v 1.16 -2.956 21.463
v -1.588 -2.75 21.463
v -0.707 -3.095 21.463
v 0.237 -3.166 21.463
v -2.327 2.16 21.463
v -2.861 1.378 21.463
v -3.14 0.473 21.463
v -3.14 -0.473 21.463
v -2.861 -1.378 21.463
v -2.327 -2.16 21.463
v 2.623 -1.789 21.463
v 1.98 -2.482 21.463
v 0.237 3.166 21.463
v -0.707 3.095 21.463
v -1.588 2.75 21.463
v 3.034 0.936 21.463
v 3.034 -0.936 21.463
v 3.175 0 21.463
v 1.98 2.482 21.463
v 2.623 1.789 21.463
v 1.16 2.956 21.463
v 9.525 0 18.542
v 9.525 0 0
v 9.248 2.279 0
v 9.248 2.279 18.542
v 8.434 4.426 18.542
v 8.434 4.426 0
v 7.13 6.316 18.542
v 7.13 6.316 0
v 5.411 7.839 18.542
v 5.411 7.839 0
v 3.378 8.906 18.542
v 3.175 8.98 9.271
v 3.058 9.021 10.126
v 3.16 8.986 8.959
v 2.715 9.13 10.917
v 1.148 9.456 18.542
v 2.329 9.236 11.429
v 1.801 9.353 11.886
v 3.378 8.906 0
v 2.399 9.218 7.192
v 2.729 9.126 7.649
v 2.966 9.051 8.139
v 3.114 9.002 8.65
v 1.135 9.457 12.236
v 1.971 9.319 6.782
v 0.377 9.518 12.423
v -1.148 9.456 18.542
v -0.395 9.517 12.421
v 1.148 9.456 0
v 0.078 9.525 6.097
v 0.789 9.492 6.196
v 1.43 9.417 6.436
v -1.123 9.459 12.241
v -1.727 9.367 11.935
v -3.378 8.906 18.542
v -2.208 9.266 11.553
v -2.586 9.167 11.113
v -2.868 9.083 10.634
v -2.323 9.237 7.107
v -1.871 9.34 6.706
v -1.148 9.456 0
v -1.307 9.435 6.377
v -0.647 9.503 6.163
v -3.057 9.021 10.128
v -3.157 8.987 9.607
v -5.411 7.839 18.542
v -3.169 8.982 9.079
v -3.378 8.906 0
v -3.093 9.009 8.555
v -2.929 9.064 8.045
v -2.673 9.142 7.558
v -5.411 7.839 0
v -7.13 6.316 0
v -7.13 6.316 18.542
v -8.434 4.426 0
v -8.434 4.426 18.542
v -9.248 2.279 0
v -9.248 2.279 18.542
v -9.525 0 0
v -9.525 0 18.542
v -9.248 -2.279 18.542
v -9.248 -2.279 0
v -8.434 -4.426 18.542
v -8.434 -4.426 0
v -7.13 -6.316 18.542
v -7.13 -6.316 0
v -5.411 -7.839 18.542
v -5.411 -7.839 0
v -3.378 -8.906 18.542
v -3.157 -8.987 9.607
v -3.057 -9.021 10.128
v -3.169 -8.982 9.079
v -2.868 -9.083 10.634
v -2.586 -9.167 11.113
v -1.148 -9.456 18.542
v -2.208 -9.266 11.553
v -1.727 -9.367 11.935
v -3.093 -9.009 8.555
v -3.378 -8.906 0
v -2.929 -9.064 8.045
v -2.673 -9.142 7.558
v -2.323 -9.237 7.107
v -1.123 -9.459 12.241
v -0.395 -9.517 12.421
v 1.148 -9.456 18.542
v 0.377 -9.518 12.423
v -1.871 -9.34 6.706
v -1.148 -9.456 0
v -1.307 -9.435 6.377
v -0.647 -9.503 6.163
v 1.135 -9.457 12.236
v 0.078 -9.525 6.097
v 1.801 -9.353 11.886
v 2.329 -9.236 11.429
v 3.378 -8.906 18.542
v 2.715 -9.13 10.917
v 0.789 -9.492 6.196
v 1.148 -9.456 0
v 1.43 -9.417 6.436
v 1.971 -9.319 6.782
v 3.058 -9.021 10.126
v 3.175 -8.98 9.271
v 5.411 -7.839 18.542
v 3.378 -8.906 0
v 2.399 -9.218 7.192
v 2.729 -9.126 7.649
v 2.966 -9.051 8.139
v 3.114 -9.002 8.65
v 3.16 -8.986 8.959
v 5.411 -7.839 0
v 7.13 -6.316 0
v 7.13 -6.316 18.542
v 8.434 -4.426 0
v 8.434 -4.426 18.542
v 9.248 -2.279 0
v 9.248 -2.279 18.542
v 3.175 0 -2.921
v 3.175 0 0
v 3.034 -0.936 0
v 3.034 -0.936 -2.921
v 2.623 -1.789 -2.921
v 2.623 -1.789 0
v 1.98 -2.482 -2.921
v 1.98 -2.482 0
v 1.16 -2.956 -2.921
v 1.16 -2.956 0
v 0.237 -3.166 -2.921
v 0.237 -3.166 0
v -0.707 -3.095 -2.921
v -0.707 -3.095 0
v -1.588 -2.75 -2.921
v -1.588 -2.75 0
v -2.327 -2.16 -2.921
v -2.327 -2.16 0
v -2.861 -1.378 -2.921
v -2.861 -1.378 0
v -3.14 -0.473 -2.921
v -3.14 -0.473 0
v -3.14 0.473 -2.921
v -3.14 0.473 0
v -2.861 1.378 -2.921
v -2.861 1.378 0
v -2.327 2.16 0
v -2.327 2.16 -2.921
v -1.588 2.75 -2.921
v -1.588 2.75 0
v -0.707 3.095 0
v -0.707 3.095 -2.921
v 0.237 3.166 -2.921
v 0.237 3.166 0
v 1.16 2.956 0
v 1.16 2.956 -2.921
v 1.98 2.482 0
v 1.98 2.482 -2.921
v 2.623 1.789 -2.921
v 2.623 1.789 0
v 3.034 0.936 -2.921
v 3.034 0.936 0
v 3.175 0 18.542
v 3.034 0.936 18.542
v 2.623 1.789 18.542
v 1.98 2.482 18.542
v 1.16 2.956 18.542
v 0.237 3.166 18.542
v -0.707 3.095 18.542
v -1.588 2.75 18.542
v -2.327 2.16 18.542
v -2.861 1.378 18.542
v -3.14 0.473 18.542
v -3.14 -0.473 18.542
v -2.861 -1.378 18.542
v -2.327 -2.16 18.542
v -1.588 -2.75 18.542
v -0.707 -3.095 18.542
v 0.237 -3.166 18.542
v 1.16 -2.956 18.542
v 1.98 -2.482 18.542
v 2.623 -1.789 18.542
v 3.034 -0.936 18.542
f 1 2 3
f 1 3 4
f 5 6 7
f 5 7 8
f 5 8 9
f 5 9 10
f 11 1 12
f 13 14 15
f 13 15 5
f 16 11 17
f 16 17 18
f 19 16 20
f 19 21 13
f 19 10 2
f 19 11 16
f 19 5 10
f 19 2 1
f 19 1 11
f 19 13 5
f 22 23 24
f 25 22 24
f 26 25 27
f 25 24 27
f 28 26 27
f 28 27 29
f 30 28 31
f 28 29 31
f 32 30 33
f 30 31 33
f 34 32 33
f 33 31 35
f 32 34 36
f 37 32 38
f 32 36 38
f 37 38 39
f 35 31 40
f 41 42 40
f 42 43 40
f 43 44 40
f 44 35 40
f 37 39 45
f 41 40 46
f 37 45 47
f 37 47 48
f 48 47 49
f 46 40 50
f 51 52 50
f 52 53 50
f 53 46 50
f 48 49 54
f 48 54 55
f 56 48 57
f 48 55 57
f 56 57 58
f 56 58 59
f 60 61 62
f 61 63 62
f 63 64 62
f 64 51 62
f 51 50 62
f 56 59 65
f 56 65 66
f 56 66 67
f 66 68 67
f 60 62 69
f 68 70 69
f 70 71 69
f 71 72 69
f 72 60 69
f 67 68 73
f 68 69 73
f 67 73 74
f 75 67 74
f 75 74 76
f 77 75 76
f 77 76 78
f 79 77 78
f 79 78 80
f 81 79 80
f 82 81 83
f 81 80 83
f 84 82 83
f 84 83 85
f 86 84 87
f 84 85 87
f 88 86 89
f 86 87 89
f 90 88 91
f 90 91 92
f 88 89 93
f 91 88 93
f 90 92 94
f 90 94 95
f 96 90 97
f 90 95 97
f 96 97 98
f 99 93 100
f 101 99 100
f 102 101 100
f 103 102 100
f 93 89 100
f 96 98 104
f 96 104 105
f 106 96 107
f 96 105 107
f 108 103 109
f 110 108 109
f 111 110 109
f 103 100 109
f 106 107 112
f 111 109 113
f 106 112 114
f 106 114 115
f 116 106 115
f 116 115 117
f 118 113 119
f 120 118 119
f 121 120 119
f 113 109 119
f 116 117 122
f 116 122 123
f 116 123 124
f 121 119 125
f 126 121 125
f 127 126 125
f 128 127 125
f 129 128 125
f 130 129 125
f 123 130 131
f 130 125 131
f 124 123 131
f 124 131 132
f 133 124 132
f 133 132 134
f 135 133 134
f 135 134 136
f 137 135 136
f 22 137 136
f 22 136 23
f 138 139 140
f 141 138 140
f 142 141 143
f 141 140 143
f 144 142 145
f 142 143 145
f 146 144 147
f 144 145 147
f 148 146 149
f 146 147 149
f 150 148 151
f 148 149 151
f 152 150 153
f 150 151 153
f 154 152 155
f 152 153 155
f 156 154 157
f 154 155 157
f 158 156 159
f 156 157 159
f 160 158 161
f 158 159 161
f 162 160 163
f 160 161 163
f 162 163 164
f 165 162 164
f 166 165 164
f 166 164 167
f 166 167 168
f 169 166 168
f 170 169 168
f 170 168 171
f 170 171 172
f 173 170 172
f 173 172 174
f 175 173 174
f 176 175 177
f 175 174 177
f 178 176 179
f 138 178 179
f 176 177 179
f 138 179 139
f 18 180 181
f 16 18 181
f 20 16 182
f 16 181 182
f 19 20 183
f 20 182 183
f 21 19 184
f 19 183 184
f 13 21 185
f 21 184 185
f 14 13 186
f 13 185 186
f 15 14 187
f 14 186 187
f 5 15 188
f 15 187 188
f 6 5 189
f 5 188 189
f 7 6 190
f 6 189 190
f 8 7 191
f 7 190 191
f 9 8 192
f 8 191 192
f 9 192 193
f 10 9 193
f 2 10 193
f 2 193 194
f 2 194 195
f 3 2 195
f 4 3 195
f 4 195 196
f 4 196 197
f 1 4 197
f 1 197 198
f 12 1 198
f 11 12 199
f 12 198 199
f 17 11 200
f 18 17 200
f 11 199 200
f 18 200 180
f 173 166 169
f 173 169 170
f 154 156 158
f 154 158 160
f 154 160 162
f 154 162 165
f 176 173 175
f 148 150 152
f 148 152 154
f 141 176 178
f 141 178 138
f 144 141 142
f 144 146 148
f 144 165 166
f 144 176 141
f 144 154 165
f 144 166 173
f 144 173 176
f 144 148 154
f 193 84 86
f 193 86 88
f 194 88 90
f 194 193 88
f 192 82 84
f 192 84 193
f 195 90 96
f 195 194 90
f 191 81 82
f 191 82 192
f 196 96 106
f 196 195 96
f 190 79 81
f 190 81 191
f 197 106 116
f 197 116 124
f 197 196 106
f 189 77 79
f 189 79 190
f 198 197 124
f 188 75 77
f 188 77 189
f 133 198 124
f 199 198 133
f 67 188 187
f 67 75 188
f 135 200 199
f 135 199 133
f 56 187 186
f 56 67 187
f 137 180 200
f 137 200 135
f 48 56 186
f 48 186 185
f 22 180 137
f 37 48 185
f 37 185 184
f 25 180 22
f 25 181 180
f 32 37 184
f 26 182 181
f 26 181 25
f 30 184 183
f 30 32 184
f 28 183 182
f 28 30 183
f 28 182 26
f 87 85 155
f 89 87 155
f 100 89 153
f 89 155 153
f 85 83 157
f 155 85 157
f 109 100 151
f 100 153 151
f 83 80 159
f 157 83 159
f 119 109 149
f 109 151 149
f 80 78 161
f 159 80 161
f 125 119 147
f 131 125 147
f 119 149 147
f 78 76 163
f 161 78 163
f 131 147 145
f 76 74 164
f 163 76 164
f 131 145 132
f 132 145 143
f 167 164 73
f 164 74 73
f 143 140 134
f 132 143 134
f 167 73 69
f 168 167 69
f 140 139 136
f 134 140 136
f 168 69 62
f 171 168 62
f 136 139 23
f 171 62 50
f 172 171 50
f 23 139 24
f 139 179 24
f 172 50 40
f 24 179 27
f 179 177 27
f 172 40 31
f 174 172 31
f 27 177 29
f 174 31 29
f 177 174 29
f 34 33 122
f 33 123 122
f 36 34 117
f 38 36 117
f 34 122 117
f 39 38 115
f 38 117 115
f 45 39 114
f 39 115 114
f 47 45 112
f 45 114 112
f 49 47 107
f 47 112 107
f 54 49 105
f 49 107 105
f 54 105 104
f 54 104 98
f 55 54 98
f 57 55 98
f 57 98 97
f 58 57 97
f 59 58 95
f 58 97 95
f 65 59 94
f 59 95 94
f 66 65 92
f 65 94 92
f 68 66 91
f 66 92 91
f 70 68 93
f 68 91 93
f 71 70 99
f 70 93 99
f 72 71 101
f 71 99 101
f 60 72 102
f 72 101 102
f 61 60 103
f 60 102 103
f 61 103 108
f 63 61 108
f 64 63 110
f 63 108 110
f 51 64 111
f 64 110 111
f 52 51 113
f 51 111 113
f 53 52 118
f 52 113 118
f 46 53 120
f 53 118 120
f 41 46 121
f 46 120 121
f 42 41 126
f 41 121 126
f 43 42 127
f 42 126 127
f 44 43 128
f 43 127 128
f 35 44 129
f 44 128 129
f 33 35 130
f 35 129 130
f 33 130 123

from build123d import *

# Parameters (mm, degrees)
F0_R          = 9.525
F1_DEPTH      = 18.542
F2_R          = 3.175
F3_DEPTH      = 2.921
F4_R          = 3.175
F5_DEPTH      = 2.921
F6_R          = 3.175
F7_DEPTH      = 25.4
F7_DEPTH_BACK = 25.4


with BuildPart() as f1:
    # F0 (on Top) → F1 (new body)
    with BuildSketch(Plane.XY):
        Circle(F0_R)
    extrude(amount=F1_DEPTH)

    # F2 (on face) → F3 (join)
    with BuildSketch(Plane.XY.offset(18.542)):
        Circle(F2_R)
    extrude(amount=F3_DEPTH)

    # F4 (on face) → F5 (join)
    with BuildSketch(Plane(origin=(0, 0, 0), x_dir=(1, 0, 0), z_dir=(0, 0, -1))):
        Circle(F4_R)
    extrude(amount=F5_DEPTH)

    # F6 (on Front) → F7 (cut, two sides)
    with BuildSketch(Plane.XZ) as f7_sk:
        with Locations((0, 9.271)):
            Circle(F6_R)
    extrude(amount=-F7_DEPTH, mode=Mode.SUBTRACT)
    extrude(f7_sk.sketch, amount=F7_DEPTH_BACK, mode=Mode.SUBTRACT)


solid = f1.part
